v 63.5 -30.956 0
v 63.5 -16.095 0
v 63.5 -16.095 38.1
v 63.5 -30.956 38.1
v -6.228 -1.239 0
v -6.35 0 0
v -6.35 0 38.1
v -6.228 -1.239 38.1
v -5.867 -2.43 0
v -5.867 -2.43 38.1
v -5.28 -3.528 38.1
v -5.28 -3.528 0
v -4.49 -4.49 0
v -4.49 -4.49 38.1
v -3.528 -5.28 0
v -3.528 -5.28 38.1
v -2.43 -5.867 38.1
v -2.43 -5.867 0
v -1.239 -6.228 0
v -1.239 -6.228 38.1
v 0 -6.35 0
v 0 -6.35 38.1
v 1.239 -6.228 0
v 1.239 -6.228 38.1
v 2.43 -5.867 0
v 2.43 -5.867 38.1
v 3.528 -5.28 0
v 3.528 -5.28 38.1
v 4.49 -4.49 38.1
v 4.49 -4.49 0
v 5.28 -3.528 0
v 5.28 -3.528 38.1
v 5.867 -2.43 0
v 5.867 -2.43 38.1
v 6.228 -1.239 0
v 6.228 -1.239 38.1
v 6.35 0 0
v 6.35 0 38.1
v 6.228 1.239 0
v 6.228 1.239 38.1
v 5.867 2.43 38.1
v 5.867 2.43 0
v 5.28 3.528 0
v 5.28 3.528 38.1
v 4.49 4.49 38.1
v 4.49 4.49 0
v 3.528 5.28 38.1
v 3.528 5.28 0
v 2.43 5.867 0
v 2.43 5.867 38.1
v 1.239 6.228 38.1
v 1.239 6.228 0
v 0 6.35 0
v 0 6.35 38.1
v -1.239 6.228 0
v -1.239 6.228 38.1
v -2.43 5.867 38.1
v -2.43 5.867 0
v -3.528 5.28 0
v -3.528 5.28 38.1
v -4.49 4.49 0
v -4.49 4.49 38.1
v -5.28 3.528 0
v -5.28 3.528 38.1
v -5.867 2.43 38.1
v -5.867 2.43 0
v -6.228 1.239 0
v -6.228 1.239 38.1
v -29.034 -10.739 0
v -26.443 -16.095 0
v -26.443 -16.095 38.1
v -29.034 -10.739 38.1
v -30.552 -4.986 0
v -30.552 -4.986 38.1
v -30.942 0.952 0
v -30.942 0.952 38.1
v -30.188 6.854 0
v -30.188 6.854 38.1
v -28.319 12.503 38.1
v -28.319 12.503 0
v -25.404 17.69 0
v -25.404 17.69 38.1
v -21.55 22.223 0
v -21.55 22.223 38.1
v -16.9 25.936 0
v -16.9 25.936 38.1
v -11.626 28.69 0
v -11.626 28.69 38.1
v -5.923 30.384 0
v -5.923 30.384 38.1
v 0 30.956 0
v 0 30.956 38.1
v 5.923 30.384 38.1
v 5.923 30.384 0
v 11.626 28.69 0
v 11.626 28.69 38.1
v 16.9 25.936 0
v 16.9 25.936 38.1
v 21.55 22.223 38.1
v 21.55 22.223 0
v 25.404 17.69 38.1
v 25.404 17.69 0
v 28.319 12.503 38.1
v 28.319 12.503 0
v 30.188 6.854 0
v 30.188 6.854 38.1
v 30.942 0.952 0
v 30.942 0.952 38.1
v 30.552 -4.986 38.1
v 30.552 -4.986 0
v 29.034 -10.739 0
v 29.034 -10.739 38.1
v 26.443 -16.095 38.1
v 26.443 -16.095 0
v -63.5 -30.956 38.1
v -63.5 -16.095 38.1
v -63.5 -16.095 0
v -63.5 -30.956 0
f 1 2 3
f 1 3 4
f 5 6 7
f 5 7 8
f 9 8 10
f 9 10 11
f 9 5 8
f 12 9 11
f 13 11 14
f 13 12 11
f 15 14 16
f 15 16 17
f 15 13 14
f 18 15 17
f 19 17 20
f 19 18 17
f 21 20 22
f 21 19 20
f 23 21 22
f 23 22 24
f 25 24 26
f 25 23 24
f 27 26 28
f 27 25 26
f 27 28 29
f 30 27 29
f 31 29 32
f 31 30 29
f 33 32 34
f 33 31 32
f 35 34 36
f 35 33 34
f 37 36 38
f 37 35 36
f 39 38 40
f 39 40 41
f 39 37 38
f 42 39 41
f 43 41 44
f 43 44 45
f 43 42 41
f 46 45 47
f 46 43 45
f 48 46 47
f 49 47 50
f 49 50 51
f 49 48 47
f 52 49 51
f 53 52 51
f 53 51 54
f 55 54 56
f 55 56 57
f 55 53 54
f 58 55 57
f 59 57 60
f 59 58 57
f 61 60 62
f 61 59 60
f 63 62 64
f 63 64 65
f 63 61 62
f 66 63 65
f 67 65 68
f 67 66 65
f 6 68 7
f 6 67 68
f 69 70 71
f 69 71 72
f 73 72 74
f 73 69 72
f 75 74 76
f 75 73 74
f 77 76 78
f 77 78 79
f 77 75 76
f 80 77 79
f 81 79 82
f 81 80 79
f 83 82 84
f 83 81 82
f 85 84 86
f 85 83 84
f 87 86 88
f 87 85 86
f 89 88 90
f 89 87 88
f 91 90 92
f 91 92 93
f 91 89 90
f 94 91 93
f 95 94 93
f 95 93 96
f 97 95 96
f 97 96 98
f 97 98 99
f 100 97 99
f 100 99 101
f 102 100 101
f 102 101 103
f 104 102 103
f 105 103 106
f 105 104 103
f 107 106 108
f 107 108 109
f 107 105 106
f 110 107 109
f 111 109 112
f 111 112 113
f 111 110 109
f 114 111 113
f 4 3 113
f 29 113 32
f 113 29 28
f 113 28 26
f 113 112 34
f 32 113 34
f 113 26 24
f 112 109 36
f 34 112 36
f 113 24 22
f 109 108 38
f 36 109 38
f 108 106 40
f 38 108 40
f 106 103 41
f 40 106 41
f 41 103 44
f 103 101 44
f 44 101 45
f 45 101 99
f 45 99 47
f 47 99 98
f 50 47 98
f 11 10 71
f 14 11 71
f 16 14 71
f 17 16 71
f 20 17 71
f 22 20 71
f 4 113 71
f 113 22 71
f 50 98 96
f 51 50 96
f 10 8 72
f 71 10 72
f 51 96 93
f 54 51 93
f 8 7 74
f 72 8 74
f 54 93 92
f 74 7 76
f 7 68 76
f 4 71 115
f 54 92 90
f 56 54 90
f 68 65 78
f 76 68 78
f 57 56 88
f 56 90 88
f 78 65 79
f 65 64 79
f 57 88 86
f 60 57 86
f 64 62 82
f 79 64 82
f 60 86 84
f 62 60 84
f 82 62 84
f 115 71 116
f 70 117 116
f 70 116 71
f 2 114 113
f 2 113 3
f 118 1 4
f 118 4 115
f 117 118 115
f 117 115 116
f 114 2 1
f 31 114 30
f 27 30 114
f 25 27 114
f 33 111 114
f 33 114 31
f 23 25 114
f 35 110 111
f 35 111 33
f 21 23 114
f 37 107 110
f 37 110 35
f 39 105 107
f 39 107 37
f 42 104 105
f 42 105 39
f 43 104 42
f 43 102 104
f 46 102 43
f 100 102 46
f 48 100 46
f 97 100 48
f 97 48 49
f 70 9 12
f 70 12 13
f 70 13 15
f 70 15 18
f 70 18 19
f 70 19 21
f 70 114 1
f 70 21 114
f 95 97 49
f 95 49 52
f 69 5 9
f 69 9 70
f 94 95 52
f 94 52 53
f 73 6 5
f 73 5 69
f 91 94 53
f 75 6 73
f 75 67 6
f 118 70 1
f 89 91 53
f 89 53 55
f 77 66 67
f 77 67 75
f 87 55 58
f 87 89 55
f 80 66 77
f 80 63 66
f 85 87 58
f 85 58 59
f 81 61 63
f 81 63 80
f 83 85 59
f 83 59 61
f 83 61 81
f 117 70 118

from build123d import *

# Parameters (mm, degrees)
SKETCH2_R           = 6.35
BOSS_EXTRUDE1_DEPTH = 38.1


with BuildPart() as part:
    # Sketch2 → Boss-Extrude1 (new body)
    with BuildSketch(Plane.XY):
        with BuildLine():
            Line((26.443106469, -16.095077953), (63.5, -16.095077953))
            Line((63.5, -16.095077953), (63.5, -30.95625))
            Line((63.5, -30.95625), (-63.5, -30.95625))
            Line((-63.5, -30.95625), (-63.5, -16.095077953))
            Line((-63.5, -16.095077953), (-26.443106469, -16.095077953))
            ThreePointArc((-26.443106469, -16.095077953), (0, 30.95625), (26.443106469, -16.095077953))
        make_face()
        with Locations(Location((0, 0, 0), (0, 0, 180))):
            Circle(SKETCH2_R, mode=Mode.SUBTRACT)
    extrude(amount=BOSS_EXTRUDE1_DEPTH)


solid = part.part
